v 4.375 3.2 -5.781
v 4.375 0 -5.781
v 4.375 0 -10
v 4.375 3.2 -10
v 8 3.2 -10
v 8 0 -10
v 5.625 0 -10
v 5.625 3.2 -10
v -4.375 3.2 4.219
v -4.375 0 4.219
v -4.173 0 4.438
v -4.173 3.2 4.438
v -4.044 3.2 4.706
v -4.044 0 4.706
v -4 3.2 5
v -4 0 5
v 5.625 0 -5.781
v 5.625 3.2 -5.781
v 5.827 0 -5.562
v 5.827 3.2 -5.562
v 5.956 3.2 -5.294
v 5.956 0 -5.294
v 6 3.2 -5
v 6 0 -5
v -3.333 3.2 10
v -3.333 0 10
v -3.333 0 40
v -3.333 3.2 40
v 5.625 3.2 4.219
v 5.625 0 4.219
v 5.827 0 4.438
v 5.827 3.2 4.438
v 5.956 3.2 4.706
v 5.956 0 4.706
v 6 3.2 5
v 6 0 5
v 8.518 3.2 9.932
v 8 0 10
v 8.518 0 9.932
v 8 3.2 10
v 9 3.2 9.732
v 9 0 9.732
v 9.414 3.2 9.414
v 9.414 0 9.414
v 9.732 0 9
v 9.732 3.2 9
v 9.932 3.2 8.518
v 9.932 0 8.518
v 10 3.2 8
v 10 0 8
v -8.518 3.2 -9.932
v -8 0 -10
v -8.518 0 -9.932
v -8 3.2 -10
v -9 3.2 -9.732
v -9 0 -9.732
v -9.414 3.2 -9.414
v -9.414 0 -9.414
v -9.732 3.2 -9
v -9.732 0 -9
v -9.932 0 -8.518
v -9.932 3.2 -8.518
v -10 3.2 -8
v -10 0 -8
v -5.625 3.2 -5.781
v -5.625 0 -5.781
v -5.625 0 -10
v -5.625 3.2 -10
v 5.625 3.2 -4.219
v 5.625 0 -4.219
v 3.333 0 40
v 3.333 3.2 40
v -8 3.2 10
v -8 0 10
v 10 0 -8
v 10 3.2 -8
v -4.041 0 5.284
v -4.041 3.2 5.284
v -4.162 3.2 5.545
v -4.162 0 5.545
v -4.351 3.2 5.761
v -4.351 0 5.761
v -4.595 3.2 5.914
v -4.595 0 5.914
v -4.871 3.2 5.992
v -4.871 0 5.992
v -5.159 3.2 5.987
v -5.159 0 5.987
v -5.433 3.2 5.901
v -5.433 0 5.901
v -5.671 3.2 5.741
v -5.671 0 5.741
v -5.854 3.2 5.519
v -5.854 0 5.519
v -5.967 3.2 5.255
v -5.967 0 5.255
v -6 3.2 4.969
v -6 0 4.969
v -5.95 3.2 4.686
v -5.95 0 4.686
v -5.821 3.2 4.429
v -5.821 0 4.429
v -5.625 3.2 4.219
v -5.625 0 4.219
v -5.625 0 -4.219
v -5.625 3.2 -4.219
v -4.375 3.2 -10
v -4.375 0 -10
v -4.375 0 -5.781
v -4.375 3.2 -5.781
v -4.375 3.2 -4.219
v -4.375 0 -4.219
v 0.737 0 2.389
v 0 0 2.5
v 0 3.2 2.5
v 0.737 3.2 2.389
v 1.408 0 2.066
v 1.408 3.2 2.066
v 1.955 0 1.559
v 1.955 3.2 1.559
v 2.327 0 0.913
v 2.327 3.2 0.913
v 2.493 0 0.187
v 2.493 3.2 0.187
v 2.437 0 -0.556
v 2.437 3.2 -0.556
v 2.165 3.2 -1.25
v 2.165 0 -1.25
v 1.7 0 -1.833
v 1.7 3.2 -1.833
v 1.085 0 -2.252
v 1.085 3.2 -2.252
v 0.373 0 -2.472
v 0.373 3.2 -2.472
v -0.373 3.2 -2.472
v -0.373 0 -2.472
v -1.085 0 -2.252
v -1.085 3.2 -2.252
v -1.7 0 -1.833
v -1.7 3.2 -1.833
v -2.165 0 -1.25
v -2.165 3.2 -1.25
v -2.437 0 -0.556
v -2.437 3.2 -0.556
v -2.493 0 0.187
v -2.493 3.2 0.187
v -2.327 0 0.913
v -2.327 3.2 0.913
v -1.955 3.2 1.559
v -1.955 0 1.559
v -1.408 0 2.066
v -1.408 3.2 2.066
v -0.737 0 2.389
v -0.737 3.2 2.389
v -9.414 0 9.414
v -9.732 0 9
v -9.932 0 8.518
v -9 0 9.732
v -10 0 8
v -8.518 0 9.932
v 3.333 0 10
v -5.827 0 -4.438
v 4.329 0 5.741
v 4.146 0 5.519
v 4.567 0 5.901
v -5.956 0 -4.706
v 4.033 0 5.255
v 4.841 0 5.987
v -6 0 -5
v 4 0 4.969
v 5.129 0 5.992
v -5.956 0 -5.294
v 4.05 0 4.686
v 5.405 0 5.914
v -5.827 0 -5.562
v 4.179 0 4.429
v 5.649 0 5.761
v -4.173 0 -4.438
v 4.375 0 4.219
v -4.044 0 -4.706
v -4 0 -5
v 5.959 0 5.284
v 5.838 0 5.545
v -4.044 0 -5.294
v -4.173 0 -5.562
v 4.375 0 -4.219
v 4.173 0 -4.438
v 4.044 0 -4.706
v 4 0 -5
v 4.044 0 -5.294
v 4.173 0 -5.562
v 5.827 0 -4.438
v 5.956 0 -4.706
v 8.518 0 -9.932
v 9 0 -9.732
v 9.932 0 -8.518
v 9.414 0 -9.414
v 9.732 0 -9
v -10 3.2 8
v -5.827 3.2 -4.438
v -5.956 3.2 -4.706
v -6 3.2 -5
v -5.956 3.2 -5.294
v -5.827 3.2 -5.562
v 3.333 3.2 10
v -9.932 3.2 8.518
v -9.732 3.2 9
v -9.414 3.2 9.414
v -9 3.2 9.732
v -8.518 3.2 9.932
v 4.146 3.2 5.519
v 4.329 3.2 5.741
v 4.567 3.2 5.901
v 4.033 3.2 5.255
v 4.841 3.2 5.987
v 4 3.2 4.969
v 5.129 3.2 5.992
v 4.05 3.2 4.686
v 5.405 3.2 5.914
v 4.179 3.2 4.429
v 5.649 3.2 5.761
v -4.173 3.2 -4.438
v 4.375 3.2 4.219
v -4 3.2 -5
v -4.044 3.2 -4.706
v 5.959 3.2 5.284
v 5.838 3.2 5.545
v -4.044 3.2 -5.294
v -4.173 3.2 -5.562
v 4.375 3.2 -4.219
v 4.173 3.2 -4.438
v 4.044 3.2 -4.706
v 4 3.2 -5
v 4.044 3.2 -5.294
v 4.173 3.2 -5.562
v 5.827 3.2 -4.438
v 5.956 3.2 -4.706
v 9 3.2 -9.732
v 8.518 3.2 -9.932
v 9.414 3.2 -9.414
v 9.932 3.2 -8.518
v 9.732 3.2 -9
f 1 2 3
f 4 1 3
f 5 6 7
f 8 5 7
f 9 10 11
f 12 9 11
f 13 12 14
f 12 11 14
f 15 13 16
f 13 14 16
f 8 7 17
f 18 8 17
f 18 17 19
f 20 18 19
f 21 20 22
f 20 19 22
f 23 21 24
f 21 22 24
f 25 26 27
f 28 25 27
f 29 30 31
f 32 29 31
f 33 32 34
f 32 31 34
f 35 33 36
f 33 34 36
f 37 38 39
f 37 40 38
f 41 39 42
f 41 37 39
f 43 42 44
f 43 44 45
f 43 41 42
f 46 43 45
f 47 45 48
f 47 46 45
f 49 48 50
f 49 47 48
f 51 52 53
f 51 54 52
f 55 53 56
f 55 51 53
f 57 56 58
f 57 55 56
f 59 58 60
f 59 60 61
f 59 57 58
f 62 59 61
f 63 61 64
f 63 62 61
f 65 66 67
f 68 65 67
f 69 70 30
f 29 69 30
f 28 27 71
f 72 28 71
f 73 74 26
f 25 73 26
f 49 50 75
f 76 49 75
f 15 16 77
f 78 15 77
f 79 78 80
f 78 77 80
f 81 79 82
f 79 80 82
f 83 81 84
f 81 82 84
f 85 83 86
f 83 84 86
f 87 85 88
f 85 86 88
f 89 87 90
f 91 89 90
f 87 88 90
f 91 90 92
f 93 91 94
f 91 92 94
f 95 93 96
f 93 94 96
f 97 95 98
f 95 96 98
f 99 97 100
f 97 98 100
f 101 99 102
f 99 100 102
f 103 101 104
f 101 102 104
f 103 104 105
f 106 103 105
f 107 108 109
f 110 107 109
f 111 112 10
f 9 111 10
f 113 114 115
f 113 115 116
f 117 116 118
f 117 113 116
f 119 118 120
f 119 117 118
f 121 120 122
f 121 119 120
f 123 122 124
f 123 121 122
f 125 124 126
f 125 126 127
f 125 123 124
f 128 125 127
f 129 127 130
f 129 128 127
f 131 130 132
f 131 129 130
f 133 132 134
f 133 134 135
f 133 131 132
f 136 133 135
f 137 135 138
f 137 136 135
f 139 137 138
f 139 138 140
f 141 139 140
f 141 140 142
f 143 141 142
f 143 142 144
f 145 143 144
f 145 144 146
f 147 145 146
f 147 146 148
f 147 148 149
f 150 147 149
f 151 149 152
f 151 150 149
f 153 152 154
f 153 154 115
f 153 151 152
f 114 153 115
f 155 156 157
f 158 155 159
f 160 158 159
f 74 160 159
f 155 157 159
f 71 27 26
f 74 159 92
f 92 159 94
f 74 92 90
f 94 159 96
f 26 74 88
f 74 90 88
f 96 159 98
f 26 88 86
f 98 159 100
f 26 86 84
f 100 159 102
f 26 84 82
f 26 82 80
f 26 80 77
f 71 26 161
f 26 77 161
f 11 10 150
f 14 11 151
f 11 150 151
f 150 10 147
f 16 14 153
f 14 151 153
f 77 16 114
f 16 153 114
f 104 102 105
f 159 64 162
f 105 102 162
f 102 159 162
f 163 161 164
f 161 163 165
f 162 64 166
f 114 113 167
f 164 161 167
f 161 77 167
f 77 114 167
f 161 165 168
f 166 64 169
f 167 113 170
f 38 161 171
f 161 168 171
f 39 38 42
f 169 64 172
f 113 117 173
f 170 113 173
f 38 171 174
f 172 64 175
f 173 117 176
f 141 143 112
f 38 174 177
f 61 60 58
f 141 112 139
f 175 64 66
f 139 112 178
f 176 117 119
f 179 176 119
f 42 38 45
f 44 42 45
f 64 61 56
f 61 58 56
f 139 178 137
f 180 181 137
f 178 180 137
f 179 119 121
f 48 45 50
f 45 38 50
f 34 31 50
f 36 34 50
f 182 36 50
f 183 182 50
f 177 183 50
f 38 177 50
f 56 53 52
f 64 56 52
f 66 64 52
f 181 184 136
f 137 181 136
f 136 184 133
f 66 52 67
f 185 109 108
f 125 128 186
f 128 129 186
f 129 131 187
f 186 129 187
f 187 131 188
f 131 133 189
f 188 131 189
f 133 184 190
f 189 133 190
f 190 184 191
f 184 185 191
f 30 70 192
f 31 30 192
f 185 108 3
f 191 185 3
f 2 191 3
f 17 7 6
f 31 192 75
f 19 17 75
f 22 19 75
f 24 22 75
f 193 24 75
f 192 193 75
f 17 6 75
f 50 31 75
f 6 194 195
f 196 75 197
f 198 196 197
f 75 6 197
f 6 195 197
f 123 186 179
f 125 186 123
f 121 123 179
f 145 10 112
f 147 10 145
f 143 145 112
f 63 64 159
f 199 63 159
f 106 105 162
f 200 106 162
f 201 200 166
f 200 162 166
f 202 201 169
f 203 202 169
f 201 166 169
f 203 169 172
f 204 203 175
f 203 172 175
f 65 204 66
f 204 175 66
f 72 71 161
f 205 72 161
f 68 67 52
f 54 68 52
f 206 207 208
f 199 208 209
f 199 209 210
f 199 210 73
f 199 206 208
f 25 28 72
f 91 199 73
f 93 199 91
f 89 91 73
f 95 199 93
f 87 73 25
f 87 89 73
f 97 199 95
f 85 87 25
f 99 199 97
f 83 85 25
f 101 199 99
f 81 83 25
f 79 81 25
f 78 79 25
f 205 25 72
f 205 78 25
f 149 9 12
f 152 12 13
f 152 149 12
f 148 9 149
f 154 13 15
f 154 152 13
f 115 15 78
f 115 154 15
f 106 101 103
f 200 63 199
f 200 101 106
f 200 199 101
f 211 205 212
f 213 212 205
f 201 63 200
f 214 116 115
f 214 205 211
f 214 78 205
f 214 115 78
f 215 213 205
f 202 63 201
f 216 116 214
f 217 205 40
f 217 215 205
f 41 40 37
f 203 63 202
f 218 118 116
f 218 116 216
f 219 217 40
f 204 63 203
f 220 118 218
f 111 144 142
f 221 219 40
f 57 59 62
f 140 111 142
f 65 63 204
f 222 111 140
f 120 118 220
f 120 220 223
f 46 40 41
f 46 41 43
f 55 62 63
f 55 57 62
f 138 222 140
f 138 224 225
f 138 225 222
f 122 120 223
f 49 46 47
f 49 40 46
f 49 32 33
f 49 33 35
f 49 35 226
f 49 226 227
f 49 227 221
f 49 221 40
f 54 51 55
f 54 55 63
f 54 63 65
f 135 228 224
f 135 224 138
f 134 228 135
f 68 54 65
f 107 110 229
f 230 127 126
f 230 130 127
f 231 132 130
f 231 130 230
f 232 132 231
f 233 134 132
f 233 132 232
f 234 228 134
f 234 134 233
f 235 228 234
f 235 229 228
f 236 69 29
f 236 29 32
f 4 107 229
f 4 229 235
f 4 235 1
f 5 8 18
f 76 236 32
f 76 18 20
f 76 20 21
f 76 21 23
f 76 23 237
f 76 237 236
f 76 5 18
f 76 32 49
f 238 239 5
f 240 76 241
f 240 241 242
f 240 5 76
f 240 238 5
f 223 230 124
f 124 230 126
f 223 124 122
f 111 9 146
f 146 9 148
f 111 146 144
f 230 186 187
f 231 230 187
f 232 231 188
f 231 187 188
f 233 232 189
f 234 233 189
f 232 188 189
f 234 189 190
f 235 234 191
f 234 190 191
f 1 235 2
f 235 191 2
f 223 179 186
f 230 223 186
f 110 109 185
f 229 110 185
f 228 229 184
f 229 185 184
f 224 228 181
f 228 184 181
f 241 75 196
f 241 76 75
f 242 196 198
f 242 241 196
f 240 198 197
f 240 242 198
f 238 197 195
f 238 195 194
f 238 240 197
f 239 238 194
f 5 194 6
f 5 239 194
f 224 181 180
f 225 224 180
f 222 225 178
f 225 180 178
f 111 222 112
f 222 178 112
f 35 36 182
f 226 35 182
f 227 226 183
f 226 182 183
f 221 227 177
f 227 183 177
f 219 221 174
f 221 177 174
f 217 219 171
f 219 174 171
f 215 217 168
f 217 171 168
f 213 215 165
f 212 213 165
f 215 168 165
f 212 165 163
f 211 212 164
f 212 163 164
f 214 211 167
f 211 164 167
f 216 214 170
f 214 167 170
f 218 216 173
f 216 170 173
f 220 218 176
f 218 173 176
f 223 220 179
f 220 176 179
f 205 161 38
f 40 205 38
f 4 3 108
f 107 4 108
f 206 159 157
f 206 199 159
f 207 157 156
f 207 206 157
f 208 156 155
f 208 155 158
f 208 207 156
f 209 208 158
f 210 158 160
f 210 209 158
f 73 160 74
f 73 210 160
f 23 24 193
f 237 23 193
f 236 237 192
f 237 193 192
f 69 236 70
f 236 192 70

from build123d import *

# Parameters (mm, degrees)
BASE_SKETCH_R       = 2.5
BOSS_EXTRUDE1_DEPTH = 3.2
FILLET1_R           = 2


with BuildPart() as part:
    # Base_Sketch → Boss-Extrude1 (new body)
    with BuildSketch(Plane(origin=(0, 0, 0), x_dir=(1, 0, 0), z_dir=(0, 1, 0))):
        with BuildLine():
            Line((-5.625, 10), (-10, 10))
            Line((-10, 10), (-10, -10))
            Line((-10, -10), (-3.333333333, -10))
            Line((-3.333333333, -10), (-3.333333333, -40))
            Line((-3.333333333, -40), (3.333333333, -40))
            Line((3.333333333, -40), (3.333333333, -10))
            Line((3.333333333, -10), (10, -10))
            Line((10, -10), (10, 10))
            Line((10, 10), (5.625, 10))
            Line((5.625, 10), (5.625, 5.78062475))
            ThreePointArc((5.625, 5.78062475), (5.901387819, 5.433012702), (6, 5))
            ThreePointArc((6, 5), (5.901387819, 4.566987298), (5.625, 4.21937525))
            Line((5.625, 4.21937525), (5.625, -4.21937525))
            ThreePointArc((5.625, -4.21937525), (5.901387819, -4.566987298), (6, -5))
            ThreePointArc((6, -5), (4.566987298, -5.901387819), (4.375, -4.21937525))
            Line((4.375, -4.21937525), (4.375, 4.21937525))
            ThreePointArc((4.375, 4.21937525), (4, 5), (4.375, 5.78062475))
            Line((4.375, 5.78062475), (4.375, 10))
            Line((4.375, 10), (-4.375, 10))
            Line((-4.375, 10), (-4.375, 5.78062475))
            ThreePointArc((-4.375, 5.78062475), (-4.098612181, 5.433012702), (-4, 5))
            ThreePointArc((-4, 5), (-4.098612181, 4.566987298), (-4.375, 4.21937525))
            Line((-4.375, 4.21937525), (-4.375, -4.21937525))
            ThreePointArc((-4.375, -4.21937525), (-4.098612181, -4.566987298), (-4, -5))
            ThreePointArc((-4, -5), (-5.433012702, -5.901387819), (-5.625, -4.21937525))
            Line((-5.625, -4.21937525), (-5.625, 4.21937525))
            ThreePointArc((-5.625, 4.21937525), (-6, 5), (-5.625, 5.78062475))
            Line((-5.625, 5.78062475), (-5.625, 10))
        make_face()
        with Locations(Location((0, 0, 0), (0, 0, 270))):
            Circle(BASE_SKETCH_R, mode=Mode.SUBTRACT)
    extrude(amount=BOSS_EXTRUDE1_DEPTH)

    # Fillet1
    fillet1_edges = [part.edges().sort_by_distance(p)[0] for p in [
        (10, 1.6, -10),
        (10, 1.6, 10),
        (-10, 1.6, 10),
        (-10, 1.6, -10),
    ]]
    fillet(fillet1_edges, radius=FILLET1_R)


solid = part.part
